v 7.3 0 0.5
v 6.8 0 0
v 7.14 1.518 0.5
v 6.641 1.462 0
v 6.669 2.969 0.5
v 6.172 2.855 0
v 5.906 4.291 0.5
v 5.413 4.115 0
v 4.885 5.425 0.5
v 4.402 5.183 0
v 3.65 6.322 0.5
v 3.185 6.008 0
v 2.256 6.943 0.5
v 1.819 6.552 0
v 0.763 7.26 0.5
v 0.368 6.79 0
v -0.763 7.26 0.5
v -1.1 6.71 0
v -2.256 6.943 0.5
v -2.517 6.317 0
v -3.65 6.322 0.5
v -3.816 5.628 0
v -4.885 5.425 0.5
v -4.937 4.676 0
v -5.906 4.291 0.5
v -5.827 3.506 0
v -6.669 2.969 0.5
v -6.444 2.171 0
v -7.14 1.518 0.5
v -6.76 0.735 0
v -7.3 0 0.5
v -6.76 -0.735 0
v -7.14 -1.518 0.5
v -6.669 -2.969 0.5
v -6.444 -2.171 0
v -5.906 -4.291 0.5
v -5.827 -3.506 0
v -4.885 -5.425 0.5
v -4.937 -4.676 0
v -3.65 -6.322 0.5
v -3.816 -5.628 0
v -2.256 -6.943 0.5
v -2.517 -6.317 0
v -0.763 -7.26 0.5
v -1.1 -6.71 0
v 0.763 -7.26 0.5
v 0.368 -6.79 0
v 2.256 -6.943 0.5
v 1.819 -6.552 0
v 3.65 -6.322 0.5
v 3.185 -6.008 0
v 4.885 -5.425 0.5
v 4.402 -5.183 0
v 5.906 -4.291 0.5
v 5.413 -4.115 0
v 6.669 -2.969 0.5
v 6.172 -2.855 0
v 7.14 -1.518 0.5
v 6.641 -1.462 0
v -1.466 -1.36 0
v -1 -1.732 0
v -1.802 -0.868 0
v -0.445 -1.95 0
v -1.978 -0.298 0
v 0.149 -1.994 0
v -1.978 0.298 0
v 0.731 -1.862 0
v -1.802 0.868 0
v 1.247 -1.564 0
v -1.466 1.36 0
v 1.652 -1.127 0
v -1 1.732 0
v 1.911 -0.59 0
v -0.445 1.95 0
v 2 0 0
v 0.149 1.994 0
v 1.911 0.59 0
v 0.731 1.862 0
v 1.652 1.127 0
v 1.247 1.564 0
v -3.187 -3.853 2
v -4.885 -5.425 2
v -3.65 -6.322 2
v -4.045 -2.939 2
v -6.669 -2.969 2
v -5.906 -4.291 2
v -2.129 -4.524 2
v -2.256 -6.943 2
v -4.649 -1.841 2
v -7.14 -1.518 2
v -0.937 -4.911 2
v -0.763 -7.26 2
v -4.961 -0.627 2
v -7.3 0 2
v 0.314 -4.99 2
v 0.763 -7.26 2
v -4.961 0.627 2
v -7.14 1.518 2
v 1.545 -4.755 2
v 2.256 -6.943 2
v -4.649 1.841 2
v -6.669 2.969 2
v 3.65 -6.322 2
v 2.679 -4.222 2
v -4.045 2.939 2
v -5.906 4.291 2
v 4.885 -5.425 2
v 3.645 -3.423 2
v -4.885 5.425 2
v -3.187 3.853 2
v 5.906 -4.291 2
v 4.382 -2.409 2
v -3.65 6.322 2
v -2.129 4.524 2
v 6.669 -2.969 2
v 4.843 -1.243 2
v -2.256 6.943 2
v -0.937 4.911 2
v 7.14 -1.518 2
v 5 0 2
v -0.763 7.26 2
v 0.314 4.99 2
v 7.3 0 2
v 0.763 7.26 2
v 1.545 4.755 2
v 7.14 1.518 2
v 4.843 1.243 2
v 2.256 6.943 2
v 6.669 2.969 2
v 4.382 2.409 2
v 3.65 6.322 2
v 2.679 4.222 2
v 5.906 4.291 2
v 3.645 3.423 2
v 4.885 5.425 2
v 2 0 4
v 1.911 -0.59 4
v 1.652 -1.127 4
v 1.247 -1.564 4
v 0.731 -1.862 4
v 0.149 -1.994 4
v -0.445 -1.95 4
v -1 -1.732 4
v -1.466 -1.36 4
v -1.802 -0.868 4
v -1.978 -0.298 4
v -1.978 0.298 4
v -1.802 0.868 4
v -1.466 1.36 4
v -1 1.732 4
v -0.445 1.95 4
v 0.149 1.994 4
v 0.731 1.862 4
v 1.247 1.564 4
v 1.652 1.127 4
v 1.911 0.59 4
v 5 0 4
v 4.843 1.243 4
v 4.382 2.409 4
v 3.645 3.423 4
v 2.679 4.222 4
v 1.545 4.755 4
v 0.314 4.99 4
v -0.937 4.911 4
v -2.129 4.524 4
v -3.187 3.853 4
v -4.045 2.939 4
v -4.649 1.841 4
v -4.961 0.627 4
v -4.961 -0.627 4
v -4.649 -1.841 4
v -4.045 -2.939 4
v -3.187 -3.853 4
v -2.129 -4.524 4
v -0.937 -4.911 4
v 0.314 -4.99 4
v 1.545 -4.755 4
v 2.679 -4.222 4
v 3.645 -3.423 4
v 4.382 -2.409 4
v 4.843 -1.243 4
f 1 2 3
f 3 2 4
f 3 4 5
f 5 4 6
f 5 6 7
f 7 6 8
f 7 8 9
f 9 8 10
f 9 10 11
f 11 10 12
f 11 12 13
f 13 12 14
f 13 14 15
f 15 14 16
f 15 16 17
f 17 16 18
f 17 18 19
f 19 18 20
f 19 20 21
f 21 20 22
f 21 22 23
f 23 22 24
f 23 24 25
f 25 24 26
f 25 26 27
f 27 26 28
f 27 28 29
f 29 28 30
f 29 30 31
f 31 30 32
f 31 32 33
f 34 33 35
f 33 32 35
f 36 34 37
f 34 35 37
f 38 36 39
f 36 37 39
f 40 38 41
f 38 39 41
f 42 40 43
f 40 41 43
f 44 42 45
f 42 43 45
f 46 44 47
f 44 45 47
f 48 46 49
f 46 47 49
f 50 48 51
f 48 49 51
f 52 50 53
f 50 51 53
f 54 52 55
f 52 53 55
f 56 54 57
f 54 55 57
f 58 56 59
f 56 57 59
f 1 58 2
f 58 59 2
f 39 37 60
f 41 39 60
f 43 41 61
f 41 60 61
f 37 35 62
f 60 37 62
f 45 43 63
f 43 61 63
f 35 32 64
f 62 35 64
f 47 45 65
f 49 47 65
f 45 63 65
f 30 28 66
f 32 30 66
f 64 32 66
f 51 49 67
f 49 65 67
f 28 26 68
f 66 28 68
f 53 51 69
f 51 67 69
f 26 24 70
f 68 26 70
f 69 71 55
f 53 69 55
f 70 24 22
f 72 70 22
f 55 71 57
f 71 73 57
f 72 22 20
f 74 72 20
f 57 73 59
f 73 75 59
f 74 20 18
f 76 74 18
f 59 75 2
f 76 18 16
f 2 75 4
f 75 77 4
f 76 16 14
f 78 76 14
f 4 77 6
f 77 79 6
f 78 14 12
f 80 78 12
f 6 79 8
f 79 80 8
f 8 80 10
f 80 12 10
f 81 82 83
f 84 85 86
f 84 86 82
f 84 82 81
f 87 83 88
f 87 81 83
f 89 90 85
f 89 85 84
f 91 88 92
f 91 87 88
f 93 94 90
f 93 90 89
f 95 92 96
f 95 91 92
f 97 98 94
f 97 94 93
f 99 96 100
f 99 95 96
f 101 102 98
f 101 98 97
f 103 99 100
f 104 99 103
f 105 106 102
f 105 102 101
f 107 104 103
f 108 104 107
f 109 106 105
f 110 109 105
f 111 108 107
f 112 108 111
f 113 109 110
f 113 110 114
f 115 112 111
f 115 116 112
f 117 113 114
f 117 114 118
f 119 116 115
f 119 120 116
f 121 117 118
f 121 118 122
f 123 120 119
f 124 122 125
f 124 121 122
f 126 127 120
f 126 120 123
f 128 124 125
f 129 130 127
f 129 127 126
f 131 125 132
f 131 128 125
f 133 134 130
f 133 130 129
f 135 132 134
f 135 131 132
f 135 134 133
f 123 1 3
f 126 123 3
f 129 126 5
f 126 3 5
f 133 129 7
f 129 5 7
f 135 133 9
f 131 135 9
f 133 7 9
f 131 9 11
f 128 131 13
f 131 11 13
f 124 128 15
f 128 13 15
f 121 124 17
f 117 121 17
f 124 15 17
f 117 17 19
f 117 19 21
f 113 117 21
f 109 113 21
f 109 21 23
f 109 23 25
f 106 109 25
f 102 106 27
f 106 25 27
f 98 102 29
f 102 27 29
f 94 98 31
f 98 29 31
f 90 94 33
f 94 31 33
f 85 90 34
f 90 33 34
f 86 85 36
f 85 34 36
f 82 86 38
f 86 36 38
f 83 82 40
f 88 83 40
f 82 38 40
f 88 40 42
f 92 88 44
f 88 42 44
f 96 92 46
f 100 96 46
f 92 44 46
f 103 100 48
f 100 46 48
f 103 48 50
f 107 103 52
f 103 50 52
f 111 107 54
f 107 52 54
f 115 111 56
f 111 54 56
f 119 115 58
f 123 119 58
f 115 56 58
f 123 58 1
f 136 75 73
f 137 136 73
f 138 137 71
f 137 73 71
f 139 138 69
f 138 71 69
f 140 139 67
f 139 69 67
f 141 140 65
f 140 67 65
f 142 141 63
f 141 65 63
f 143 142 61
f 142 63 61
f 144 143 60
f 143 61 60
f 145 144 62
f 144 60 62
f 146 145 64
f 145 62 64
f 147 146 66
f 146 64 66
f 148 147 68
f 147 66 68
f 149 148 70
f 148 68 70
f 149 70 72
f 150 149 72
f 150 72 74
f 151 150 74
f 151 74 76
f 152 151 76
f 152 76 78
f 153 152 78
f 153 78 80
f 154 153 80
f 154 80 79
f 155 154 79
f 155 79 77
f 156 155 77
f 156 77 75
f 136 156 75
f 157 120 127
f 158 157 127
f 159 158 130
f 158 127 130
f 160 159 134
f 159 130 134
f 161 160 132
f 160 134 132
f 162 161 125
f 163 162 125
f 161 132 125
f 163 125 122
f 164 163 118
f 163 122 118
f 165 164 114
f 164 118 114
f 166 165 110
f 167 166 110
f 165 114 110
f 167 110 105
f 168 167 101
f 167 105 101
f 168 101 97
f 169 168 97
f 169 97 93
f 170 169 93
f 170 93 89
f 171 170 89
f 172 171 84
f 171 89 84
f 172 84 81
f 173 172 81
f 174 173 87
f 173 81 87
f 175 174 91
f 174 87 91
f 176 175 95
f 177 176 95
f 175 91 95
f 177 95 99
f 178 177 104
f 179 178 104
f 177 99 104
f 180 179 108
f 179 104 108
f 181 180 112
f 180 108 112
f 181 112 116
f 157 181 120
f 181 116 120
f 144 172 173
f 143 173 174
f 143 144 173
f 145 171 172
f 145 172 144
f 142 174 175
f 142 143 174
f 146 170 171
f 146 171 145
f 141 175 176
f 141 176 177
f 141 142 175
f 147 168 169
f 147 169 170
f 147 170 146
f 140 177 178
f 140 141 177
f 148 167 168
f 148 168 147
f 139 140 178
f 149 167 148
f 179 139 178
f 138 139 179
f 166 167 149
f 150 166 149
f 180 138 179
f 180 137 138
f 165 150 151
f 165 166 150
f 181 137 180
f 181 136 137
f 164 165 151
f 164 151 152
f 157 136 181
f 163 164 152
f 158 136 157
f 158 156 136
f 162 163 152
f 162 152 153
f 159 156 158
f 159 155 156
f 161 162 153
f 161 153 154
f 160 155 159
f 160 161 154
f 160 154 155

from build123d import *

# Parameters (mm, degrees)
F0_R     = 7.3
F1_DEPTH = 2
F2_R     = 5
F3_DEPTH = 2
F4_SIZE  = 0.5
F5_R     = 2
F6_DEPTH = 4.001


with BuildPart() as f1:
    # F0 (on Top) → F1 (new body)
    with BuildSketch(Plane.XY):
        Circle(F0_R)
    extrude(amount=F1_DEPTH)

    # F2 (on face) → F3 (join)
    with BuildSketch(Plane.XY.offset(2)):
        Circle(F2_R)
    extrude(amount=F3_DEPTH)

    # F4
    f4_edges = [f1.edges().sort_by_distance(p)[0] for p in [
        (-7.3, 0, 0),
    ]]
    chamfer(f4_edges, length=F4_SIZE)

    # F5 (on face) → F6 (cut, through all)
    with BuildSketch(Plane(origin=(0, 0, 0), x_dir=(1, 0, 0), z_dir=(0, 0, -1))):
        Circle(F5_R)
    extrude(amount=-F6_DEPTH, mode=Mode.SUBTRACT)


solid = f1.part
